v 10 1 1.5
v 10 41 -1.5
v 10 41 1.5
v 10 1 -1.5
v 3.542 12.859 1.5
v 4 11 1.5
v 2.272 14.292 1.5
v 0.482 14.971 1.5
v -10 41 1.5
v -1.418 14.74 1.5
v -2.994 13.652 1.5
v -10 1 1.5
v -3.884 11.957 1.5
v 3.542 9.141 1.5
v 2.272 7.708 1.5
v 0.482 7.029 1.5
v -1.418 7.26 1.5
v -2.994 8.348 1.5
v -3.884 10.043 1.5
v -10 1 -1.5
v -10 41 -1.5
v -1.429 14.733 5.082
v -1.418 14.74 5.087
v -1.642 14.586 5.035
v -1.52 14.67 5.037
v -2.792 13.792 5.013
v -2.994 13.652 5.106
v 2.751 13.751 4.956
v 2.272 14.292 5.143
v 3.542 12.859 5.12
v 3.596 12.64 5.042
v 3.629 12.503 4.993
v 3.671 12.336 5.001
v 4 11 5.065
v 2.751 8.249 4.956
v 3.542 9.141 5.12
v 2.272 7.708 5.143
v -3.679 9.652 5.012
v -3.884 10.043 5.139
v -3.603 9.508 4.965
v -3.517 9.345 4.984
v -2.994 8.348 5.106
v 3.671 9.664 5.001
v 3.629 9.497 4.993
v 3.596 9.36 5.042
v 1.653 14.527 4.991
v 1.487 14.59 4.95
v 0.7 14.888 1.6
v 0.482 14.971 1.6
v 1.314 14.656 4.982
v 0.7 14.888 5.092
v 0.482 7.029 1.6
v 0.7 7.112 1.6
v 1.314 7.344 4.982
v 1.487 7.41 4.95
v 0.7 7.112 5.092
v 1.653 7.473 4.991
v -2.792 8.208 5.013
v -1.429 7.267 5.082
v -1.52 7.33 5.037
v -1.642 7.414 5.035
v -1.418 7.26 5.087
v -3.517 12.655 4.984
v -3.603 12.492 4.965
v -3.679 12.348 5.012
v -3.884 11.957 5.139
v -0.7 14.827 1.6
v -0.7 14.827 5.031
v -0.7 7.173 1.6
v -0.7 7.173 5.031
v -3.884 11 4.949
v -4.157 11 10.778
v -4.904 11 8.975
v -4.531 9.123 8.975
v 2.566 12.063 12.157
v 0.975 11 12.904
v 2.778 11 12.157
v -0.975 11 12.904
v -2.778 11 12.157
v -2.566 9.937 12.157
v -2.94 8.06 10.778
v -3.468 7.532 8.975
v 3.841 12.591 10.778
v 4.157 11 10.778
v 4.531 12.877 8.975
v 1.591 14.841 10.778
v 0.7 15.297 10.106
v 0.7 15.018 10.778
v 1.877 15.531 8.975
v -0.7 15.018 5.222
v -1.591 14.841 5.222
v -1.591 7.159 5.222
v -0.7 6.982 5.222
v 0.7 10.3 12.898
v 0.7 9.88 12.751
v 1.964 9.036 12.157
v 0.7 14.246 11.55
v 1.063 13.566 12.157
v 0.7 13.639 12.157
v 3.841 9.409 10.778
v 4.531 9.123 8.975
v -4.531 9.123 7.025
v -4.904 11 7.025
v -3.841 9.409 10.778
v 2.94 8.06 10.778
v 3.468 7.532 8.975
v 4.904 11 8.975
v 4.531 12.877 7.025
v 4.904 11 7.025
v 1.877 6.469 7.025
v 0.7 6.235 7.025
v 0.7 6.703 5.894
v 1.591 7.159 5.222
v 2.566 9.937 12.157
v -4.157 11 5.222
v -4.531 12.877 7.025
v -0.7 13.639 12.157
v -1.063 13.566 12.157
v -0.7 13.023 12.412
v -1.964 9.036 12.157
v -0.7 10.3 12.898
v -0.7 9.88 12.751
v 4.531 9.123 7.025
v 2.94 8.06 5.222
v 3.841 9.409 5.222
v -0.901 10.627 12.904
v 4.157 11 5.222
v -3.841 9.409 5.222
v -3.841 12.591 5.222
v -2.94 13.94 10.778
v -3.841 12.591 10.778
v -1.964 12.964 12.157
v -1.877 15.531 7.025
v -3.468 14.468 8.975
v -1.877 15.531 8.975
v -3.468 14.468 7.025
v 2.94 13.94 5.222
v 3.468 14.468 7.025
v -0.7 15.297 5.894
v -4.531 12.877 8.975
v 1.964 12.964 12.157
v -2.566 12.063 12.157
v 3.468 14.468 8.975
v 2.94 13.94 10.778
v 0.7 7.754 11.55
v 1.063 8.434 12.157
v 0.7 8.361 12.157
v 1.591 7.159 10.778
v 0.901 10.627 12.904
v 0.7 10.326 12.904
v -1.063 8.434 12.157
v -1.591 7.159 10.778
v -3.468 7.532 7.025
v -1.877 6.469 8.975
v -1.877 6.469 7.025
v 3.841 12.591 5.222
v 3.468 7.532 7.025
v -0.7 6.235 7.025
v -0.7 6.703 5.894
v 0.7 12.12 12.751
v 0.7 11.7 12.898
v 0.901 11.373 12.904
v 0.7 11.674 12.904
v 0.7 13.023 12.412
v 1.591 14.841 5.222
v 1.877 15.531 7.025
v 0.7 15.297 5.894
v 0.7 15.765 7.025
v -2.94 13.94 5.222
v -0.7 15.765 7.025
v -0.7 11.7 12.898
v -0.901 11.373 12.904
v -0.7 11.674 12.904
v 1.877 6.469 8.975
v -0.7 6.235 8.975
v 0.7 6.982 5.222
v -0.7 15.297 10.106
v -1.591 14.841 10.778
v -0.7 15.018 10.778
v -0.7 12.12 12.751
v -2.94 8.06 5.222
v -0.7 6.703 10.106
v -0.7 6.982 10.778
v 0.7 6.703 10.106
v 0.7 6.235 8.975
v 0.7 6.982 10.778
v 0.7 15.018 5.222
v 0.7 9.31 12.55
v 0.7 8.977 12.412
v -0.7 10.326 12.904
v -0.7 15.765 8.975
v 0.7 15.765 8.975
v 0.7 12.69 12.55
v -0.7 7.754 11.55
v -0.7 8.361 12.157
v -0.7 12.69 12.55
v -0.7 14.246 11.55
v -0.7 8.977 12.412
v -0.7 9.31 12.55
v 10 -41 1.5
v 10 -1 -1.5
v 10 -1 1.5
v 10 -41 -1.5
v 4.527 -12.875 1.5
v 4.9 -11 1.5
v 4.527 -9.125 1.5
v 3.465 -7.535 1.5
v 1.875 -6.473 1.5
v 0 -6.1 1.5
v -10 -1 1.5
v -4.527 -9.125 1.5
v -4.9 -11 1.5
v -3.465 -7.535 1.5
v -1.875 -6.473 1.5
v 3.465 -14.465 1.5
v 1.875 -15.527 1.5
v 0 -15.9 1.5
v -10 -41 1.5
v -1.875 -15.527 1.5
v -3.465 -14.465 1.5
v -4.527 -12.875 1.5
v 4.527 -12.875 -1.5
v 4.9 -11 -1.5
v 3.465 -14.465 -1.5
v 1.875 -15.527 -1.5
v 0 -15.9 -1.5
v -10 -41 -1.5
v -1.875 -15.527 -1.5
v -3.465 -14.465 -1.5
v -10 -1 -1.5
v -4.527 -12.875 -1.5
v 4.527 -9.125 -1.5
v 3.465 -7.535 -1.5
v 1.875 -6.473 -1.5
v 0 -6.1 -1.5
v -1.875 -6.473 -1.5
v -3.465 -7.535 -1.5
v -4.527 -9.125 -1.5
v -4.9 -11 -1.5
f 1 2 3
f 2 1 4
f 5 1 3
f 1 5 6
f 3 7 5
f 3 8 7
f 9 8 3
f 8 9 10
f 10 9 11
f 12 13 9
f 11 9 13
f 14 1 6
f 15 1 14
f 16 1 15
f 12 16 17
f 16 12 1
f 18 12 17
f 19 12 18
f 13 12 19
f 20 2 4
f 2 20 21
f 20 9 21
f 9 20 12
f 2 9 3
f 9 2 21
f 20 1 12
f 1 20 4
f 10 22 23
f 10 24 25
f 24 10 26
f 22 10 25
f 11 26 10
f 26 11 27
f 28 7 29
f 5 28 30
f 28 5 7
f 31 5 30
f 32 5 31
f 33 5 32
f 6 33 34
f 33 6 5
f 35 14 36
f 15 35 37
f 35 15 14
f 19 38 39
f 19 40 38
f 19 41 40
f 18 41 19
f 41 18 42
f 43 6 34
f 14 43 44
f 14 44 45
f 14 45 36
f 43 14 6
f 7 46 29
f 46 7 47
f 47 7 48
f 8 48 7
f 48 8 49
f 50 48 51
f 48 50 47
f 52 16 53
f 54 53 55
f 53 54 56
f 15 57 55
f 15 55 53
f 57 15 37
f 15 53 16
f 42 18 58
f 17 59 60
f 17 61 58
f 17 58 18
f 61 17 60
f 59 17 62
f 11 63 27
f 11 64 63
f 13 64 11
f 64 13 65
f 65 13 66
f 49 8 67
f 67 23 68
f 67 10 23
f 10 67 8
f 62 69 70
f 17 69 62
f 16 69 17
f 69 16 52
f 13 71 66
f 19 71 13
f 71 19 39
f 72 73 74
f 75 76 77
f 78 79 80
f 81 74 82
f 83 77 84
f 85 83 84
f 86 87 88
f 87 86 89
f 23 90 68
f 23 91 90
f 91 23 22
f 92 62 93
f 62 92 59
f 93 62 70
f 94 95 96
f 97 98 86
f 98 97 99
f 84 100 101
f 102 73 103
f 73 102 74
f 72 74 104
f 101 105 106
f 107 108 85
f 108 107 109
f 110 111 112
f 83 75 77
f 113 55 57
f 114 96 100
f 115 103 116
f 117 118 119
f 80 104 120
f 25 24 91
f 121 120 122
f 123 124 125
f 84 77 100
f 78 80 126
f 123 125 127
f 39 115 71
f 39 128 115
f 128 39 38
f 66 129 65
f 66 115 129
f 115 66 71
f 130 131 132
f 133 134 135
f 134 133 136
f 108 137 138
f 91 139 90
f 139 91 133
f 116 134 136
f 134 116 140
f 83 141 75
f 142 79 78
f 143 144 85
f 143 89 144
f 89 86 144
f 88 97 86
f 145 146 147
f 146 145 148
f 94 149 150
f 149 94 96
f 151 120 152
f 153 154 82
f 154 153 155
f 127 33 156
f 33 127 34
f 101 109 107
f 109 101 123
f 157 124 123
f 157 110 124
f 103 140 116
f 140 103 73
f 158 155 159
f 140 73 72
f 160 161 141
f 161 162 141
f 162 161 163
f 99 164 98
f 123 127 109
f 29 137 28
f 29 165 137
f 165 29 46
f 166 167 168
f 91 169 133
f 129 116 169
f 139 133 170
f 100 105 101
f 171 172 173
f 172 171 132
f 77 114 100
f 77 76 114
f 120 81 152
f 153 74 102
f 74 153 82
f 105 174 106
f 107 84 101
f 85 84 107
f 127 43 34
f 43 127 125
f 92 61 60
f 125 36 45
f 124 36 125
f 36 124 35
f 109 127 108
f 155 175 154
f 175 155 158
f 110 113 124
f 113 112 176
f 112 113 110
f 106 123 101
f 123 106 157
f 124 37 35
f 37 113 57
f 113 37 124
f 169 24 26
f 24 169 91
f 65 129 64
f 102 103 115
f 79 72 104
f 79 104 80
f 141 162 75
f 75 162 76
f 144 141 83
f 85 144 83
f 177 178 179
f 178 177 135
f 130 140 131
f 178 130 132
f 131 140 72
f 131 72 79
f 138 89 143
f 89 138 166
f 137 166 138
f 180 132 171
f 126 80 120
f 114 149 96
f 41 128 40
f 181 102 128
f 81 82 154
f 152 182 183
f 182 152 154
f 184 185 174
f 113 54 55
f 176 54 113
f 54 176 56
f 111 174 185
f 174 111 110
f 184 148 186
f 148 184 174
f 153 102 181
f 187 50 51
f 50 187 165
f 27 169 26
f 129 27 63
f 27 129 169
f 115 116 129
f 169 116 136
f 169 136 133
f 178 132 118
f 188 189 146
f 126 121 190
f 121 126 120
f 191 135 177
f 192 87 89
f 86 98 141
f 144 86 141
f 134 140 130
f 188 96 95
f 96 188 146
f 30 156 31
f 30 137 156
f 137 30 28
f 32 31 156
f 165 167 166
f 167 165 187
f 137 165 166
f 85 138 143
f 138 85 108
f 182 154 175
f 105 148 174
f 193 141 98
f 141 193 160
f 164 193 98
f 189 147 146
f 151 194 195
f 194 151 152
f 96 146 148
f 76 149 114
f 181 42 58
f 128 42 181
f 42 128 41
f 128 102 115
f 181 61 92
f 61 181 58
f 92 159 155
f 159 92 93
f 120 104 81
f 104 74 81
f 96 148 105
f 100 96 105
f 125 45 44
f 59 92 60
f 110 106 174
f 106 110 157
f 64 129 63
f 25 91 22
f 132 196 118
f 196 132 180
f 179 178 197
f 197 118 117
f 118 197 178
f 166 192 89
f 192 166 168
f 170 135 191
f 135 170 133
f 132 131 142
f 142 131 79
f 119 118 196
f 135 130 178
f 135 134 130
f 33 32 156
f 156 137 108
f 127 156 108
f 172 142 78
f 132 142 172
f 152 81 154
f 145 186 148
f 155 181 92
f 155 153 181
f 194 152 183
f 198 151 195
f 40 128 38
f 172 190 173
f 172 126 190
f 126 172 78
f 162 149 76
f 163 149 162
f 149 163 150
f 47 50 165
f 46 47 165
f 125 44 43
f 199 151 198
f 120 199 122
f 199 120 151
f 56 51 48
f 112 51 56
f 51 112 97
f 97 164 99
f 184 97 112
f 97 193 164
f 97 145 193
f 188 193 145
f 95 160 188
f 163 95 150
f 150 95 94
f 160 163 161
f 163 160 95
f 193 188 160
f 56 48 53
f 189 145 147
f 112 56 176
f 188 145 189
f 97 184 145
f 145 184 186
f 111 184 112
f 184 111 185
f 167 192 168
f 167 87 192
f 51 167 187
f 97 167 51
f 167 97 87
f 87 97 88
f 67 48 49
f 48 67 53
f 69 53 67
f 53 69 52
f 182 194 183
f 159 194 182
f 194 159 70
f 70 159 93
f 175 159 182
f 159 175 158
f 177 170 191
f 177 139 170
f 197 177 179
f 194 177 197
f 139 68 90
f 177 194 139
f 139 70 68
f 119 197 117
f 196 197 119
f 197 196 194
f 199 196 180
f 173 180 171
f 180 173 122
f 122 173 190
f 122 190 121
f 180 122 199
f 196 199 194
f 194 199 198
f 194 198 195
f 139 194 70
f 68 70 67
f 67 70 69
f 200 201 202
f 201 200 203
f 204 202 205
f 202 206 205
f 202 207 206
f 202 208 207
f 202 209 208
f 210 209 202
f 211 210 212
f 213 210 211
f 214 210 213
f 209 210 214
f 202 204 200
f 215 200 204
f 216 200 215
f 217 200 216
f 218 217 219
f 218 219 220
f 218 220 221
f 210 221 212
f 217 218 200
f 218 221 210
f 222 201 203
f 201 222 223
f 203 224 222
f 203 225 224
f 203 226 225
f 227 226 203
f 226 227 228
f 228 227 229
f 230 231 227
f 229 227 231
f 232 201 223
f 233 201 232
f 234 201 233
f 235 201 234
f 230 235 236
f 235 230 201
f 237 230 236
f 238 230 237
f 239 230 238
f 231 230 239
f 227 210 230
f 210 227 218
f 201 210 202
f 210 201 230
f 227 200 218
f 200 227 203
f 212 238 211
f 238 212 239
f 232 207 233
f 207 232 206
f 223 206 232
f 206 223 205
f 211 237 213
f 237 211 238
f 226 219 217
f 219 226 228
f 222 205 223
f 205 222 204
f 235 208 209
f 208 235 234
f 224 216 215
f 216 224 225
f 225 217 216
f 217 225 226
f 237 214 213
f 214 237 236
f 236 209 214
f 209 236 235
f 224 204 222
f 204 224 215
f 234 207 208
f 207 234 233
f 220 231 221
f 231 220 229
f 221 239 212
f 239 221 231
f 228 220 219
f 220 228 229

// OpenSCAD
// file: constants.scad
/*
 * Written by Dermot Tynan, Kalopa Research.
 * GPLv2.
 *
 * This file has all the constants for the OpenWing sail.
 *
 * All dimensions are in mm.
 */

bearing_inner_radius = 4.0;
bearing_outer_radius = 11.0 * 1.02;
bearing_height = 7.0;

mast_clearance_radius = 5.0;

a_section_chord = 133.0;

le_tube_radius = 4.0 * 1.0625;

te_depth = 6.4;
te_width = 20.0;
// main file
/*
 * Written by Dermot Tynan, Kalopa Research.
 * GPLv2.
 *
 * This is the definition for the four mast supports on the lower
 * leading-edge of the mast, A0 -> A3.
 *
 * All dimensions are in mm.
 */
include <constants.scad>

module hinge_male()
{
	difference() {
		union() {
			translate([0, 10, 0]) cube([20, 40, 3], center = true);
			translate([0, 0, 3]) cylinder(r = 4, h = 6, center = true);
			translate([0, 0, 8]) sphere(r = 5, center = true);
		}
		translate([0, 0, 7.6]) cube([1.4, 10, 12], center = true);
	}
}

module hinge_female()
{
	difference() {
		translate([0, -10, 0]) cube([20, 40, 3], center = true);
		cylinder(r = 4.9, h = 5, center = true);
	}
}

translate([0, 11, 0]) hinge_male();
translate([0, -11, 0]) hinge_female();
